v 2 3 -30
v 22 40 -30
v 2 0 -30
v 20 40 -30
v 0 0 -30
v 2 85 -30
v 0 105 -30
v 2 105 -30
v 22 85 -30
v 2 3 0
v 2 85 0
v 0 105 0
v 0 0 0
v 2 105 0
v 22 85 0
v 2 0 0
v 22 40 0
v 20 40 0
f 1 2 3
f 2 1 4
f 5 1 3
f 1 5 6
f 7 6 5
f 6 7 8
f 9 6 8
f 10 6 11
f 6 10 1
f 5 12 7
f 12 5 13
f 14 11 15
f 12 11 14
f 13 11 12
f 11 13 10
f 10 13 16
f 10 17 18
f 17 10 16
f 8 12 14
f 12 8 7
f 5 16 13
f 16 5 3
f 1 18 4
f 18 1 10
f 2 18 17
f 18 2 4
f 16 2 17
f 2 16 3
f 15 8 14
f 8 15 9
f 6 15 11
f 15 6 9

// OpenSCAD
doorThickness = 40;
distanceToFloor = 15;

stopperWidth = 30;
stopperLength = doorThickness * 2.5 + 5;
stopperHeight = distanceToFloor + 5;

rotate([0, 90, 0]) {
  cube([stopperWidth, stopperLength, 2]);

  hull() {
    translate([0, 0, 2]) {
      polyhedron(
          points = [
            [0, 0, 0],
            [stopperWidth, 0, 0],
            [stopperWidth, 3, 0],
            [0, 3, 0],
            [0, doorThickness, stopperHeight],
            [stopperWidth, doorThickness, stopperHeight],
            [stopperWidth, doorThickness, stopperHeight - 2],
            [0, doorThickness, stopperHeight - 2],
          ],
          faces = [
            [0, 1, 2, 3],
            [4, 5, 6, 7],
            [0, 1, 5, 4],
            [2, 3, 7, 6],
            [0, 3, 7, 4],
            [1, 2, 6, 5],
          ]
      );
    }
  }

  hull() {
    translate([0, stopperLength - doorThickness / 2, 2]) {
      polyhedron(
          points = [
            [0, 0, 0],
            [stopperWidth, 0, 0],
            [stopperWidth, doorThickness / 2, 0],
            [0, doorThickness / 2, 0],
            [stopperWidth, 0, stopperHeight],
            [0, 0, stopperHeight],
          ],
          faces = [
            [0, 1, 2, 3],
            [0, 1, 4, 5],
            [4, 5, 3, 2],
            [0, 3, 5],
            [1, 2, 4],
          ]
      );
    }
  }
}
